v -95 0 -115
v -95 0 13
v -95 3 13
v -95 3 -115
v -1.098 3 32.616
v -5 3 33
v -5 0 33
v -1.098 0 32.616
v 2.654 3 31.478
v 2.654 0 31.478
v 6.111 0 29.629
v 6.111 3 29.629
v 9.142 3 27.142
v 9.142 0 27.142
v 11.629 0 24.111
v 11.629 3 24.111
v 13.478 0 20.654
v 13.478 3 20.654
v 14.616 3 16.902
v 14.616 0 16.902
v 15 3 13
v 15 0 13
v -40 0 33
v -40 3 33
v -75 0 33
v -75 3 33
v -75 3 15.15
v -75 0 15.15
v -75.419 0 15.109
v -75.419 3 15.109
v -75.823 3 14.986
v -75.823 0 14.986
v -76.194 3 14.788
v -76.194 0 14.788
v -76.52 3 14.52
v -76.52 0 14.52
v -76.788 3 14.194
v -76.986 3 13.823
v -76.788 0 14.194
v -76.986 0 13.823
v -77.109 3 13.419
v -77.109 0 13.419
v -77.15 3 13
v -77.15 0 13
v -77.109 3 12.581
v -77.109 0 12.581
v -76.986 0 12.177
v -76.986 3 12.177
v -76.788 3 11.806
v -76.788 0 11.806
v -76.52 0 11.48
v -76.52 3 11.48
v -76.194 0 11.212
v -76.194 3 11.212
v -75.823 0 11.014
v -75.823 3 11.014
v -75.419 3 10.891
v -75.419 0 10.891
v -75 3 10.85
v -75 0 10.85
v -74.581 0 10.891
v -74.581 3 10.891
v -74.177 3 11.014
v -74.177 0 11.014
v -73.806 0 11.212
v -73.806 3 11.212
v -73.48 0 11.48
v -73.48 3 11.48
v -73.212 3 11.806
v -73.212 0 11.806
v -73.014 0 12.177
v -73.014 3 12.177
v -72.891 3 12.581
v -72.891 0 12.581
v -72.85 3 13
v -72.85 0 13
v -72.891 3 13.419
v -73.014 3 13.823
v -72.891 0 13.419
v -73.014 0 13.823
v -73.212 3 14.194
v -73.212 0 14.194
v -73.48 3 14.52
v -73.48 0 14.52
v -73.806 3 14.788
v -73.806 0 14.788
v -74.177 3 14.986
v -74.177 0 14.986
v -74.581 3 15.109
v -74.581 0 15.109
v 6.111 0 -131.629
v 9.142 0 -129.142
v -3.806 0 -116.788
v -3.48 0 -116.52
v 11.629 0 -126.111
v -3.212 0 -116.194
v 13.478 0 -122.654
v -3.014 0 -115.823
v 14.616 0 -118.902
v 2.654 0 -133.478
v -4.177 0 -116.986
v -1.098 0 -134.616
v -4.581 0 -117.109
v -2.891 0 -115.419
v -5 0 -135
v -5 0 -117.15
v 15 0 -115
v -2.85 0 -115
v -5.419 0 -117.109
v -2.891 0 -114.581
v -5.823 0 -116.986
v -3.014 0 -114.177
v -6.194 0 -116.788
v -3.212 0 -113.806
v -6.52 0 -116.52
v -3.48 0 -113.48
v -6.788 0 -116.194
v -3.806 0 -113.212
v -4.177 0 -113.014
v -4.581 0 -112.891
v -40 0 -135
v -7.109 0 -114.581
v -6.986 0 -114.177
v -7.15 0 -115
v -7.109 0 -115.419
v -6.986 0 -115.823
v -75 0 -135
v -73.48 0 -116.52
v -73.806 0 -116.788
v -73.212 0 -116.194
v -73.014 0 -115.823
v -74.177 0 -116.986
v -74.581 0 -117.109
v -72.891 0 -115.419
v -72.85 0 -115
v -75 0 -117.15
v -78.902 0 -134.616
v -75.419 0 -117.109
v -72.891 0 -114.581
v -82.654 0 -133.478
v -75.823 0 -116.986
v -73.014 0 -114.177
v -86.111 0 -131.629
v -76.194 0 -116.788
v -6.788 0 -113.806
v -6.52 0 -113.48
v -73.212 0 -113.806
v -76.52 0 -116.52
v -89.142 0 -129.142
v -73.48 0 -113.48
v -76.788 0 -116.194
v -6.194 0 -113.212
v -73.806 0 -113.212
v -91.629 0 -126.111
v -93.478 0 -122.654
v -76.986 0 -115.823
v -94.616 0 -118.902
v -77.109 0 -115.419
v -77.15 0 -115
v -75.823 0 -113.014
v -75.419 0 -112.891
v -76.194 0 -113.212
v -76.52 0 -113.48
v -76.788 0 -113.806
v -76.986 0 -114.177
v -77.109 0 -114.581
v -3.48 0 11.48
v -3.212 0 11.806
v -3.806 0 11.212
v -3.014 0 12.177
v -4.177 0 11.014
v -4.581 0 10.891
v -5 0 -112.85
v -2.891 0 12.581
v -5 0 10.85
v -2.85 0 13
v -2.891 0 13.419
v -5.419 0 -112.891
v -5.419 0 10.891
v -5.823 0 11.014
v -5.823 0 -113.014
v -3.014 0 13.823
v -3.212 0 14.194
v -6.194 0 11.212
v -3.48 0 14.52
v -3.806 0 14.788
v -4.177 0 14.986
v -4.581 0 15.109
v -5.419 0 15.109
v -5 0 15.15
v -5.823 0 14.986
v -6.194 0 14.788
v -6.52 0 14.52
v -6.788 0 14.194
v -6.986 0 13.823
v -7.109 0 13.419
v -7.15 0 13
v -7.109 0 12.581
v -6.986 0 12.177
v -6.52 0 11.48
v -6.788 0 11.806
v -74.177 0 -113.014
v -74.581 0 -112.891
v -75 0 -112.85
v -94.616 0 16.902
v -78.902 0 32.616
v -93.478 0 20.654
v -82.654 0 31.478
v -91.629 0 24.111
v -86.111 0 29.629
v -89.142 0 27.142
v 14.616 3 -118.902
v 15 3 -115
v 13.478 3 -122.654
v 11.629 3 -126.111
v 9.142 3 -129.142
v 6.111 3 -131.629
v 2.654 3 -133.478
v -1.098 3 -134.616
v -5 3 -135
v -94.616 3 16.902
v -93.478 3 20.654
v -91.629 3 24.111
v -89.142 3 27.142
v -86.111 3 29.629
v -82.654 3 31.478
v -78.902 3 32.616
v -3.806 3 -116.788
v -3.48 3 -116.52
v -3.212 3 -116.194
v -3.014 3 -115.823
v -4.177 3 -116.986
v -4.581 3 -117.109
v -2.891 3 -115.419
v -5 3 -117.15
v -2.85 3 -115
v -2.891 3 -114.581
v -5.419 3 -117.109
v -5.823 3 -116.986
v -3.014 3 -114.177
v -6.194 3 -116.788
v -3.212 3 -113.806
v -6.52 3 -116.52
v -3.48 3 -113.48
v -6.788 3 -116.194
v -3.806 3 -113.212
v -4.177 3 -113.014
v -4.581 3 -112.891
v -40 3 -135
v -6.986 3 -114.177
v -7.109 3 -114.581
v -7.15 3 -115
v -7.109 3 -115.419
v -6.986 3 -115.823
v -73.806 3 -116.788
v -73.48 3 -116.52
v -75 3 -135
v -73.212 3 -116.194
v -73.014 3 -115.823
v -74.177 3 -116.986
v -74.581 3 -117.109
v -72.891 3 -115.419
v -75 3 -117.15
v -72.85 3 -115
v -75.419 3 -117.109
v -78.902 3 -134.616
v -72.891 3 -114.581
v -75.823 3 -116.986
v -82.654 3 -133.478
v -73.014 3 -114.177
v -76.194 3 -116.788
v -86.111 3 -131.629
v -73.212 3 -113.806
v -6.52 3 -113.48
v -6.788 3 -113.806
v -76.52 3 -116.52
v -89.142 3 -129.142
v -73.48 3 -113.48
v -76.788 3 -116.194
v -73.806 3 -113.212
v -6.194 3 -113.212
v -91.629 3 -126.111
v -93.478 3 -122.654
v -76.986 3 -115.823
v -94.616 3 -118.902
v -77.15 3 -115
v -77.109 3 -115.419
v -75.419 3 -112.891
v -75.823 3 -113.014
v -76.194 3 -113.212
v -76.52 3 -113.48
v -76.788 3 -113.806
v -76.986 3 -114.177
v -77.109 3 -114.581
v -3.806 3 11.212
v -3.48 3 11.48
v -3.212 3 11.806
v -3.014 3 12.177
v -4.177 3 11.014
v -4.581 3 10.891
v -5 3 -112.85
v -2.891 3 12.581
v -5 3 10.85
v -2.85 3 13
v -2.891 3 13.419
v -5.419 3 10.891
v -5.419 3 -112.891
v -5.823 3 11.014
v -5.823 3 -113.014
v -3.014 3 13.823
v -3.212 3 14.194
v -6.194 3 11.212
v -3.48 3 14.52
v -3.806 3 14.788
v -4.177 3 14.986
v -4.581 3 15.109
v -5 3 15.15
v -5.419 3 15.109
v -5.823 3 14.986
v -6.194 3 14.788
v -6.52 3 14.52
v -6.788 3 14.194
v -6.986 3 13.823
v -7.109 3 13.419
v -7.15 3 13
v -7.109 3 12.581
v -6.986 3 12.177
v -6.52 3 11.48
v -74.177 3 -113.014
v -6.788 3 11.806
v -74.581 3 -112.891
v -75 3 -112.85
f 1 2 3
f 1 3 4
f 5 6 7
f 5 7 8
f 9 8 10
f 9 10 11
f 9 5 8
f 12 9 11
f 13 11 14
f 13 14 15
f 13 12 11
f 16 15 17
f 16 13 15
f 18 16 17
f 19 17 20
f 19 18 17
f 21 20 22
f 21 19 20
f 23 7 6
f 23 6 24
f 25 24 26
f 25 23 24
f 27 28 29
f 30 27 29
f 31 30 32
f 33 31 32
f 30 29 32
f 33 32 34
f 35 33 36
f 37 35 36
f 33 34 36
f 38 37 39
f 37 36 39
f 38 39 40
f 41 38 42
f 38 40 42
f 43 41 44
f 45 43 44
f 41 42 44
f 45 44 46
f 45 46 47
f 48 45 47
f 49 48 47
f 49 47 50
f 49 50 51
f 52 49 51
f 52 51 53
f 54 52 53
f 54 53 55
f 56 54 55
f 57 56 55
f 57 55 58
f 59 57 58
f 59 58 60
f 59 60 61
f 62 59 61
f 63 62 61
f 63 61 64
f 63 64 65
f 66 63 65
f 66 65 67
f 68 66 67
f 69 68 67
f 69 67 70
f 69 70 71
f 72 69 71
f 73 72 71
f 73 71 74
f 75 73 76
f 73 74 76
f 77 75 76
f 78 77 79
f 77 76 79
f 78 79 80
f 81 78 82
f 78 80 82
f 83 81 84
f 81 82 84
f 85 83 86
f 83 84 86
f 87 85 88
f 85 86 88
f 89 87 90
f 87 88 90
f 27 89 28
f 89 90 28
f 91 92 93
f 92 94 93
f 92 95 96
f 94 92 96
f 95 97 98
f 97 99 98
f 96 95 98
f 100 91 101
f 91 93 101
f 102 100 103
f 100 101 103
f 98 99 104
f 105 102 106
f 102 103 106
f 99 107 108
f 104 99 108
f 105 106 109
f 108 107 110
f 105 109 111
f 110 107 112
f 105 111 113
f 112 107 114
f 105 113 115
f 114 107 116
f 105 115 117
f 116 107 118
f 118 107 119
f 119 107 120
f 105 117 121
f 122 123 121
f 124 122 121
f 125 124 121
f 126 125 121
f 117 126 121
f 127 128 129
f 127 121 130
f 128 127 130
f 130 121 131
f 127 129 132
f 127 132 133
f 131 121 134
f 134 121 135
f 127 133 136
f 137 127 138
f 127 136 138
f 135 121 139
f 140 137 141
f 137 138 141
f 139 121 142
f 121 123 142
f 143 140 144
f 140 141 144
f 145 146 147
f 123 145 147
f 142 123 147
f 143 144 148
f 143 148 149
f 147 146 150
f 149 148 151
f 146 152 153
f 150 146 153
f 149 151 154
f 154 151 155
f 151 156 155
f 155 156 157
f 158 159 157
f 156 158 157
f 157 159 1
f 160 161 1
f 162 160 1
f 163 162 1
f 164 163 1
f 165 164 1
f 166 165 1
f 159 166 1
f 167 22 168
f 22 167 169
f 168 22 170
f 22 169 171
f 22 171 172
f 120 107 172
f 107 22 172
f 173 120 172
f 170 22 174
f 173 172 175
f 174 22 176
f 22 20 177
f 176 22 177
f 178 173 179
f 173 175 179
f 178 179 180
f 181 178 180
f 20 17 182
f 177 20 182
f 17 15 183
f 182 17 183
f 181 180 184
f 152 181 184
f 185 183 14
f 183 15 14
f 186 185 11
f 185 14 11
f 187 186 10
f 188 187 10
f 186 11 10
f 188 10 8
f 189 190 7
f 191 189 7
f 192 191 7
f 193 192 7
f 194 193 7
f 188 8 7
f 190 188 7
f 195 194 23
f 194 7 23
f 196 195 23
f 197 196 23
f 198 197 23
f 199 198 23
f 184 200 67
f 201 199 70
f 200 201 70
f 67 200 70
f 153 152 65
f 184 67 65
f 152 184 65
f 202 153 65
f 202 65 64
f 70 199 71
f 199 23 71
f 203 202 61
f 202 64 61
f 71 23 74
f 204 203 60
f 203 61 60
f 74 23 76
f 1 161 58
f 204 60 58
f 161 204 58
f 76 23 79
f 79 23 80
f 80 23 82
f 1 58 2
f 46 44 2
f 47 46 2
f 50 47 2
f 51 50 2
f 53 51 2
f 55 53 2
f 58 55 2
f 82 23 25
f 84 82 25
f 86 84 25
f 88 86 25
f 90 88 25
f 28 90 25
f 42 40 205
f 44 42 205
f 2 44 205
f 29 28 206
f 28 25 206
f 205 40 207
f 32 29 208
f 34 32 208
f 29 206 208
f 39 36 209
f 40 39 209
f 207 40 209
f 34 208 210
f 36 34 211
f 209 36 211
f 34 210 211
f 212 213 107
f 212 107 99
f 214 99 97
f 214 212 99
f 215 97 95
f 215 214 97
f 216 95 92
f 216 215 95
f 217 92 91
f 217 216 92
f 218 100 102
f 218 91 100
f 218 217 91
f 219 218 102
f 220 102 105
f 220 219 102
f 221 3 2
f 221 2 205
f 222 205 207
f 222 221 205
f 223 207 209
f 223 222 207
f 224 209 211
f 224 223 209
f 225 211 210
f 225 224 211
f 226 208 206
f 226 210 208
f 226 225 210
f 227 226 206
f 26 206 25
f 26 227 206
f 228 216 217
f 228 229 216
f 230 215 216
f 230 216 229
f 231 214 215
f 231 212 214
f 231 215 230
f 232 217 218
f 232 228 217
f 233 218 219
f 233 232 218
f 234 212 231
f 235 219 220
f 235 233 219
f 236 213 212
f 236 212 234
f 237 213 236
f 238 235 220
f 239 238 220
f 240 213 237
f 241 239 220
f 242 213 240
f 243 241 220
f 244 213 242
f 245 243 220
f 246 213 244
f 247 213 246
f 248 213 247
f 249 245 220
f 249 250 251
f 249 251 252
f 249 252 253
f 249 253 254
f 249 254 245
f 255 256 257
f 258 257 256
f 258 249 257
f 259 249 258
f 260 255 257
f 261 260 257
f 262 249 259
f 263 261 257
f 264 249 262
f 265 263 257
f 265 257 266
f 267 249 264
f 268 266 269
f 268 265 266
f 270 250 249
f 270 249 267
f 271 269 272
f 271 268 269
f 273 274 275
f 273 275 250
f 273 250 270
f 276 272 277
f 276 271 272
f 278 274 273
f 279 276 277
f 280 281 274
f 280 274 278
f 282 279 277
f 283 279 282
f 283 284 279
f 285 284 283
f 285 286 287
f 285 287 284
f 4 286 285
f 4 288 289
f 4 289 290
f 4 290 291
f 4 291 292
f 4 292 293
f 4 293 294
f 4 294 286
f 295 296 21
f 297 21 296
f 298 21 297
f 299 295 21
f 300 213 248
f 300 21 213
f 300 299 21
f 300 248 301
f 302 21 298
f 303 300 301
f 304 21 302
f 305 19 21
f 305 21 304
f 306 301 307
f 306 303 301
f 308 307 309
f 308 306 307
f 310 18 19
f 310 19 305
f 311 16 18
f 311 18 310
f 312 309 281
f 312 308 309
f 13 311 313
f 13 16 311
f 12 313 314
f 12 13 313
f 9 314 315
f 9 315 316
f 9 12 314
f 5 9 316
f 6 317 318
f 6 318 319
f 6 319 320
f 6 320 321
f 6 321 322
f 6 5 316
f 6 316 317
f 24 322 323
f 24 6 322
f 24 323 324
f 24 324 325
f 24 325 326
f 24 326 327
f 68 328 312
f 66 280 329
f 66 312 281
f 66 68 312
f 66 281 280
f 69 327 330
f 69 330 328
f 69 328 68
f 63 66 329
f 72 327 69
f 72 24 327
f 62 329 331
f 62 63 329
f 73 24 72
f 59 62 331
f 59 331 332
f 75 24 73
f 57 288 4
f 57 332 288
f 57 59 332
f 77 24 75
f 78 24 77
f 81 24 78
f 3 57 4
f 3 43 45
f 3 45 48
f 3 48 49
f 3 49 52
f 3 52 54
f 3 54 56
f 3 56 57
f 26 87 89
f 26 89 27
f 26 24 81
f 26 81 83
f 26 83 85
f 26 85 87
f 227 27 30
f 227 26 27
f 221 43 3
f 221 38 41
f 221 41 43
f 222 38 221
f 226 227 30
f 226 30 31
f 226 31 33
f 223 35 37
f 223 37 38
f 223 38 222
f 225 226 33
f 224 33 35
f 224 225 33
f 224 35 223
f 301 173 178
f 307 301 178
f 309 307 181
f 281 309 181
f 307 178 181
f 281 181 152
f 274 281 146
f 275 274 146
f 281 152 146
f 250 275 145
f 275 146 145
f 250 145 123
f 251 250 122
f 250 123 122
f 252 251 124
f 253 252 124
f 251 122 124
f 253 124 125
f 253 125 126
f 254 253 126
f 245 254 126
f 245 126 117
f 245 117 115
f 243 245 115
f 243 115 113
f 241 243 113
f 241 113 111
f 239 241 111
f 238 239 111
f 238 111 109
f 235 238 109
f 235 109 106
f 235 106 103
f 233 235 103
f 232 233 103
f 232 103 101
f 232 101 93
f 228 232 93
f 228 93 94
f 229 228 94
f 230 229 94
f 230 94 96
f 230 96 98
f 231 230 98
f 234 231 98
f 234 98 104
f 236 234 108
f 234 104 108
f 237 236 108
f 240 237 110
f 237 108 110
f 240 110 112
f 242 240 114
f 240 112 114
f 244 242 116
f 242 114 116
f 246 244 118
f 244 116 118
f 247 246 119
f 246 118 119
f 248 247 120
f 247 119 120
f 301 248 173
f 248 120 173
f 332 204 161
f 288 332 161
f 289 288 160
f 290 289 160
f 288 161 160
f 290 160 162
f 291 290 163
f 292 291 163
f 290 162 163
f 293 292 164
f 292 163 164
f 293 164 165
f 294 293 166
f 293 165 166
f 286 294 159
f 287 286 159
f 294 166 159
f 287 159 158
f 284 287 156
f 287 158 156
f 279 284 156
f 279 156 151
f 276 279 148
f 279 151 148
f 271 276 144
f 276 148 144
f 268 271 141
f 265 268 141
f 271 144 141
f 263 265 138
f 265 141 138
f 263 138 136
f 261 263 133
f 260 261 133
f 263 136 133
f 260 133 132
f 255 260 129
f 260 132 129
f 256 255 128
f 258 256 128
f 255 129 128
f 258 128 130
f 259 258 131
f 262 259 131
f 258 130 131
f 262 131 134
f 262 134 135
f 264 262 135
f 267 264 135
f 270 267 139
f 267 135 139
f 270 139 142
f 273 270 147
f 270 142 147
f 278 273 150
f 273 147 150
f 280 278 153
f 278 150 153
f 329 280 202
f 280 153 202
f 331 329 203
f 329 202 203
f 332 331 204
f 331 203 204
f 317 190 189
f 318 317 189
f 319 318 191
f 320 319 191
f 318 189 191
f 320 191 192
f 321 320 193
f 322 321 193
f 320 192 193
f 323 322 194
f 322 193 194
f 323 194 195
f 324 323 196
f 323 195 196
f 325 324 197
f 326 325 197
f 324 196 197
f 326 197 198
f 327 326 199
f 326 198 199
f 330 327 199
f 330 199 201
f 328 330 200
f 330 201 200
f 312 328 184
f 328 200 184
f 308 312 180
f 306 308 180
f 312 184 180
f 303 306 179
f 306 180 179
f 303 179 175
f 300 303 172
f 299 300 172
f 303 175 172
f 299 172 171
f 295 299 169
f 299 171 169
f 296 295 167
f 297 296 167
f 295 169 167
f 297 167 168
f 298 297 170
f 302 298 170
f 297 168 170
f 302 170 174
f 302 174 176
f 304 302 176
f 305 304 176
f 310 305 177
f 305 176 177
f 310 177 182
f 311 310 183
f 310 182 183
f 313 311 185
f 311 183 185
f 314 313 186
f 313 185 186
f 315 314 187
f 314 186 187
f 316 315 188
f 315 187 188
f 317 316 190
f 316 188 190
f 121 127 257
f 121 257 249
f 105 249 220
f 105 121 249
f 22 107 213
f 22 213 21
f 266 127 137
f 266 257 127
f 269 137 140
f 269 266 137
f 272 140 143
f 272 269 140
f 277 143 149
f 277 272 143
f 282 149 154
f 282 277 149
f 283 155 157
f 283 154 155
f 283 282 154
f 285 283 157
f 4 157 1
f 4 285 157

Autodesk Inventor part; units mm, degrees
ref_plane "YZ Plane" through (0, 0, 0) normal (1, 0, 0) x (0, 1, 0)
sketch "Sketch1" plane through (0, 0, 0) normal (0, 1, 0) x (-1, 0, 0)
  line L0 (-15, 33) -> (95, 33)
  line L1 (95, 33) -> (95, -135)
  line L2 (95, -135) -> (-15, -135)
  line L3 (-15, -135) -> (-15, 33)
  line L4 (95, 33) -> (95, 15)
  line L5 (-15, 33) -> (-15, 13)
  line L6 (95, -135) -> (95, -115)
  line L7 (-15, -135) -> (-15, -115)
  line L8 (40, -135) -> (40, -130)
  line L9 (31, -130) -> (49, -130)
  line L10 (49, -130) -> (49, -106)
  line L11 (49, -106) -> (31, -106)
  line L12 (31, -106) -> (31, -130)
  line L13 (40, 33) -> (40, 28)
  line L14 (31, 28) -> (49, 28)
  line L15 (49, 28) -> (49, 4)
  line L16 (49, 4) -> (31, 4)
  line L17 (31, 4) -> (31, 28)
  point P0 (0, 0)
  point P1 (47.5, 33)
  point P2 (12.5, 33)
  point P3 (67.5, -135)
  point P4 (32.5, -135)
  dimension "d4" = 110
  dimension "d5" = 168
  dimension "d22" = 5
  dimension "d23" = 18
  dimension "d24" = 24
  dimension "d25" = 5
  dimension "d26" = 18
  dimension "d27" = 24
extrude "Extrusion2" add sketch "Sketch1" along normal blind 3 contours L9 L12 L11 L10 | L14 L15 L16 L17 | L0 L1 L2 L3
fillet "Fillet1" radius 20 4 edges at (15, 1.5, 33) (-95, 1.5, 33) (15, 1.5, -135) (-95, 1.5, -135)
ref_plane "Work Plane1" through (-75, 0, -51) normal (0, 0, 1) x (1, 0, 0)
ref_plane "Work Plane2" through (-40, 0, 13) normal (1, 0, 0) x (0, 0, -1)
sketch "Sketch2" plane through (0, 3, 0) normal (0, 1, 0) x (1, 0, 0)
  arc A0 (-95, -13) -> (-75, -33) centre (-75, -13) ccw projected
  line L0 (-95, -33) -> (-95, -13)
  line L1 (-75, -33) -> (-5, -33) projected
  line L2 (-95, -33) -> (-75, -33)
  line L3 (-75, -33) -> (-75, -13)
  line L4 (-75, -13) -> (-95, -13)
  arc A1 (-5, -33) -> (15, -13) centre (-5, -13) ccw projected
  line L5 (15, -33) -> (-5, -33)
  line L6 (15, -33) -> (15, -13)
  line L7 (-5, -33) -> (-5, -13)
  line L8 (-5, -13) -> (15, -13)
  arc A2 (15, 115) -> (-5, 135) centre (-5, 115) ccw projected
  line L9 (15, 135) -> (15, 115)
  line L10 (15, 135) -> (-5, 135)
  line L11 (-5, 135) -> (-5, 115)
  line L12 (-5, 115) -> (15, 115)
  arc A3 (-75, 135) -> (-95, 115) centre (-75, 115) ccw projected
  line L13 (-95, 135) -> (-95, 115)
  line L14 (-95, 135) -> (-75, 135)
  line L15 (-95, 115) -> (-95, -13) projected
  line L16 (-95, 115) -> (-75, 115)
  line L17 (-75, 115) -> (-75, 135)
  point P0 (0, 0)
hole "Hole2" at (-75, 3, 13) at (-75, 3, -115) at (-5, 3, -115) at (-5, 3, 13) direction (0, -1, 0) diameter 4.3 end through all
properties part number "BedHousingFrame"
